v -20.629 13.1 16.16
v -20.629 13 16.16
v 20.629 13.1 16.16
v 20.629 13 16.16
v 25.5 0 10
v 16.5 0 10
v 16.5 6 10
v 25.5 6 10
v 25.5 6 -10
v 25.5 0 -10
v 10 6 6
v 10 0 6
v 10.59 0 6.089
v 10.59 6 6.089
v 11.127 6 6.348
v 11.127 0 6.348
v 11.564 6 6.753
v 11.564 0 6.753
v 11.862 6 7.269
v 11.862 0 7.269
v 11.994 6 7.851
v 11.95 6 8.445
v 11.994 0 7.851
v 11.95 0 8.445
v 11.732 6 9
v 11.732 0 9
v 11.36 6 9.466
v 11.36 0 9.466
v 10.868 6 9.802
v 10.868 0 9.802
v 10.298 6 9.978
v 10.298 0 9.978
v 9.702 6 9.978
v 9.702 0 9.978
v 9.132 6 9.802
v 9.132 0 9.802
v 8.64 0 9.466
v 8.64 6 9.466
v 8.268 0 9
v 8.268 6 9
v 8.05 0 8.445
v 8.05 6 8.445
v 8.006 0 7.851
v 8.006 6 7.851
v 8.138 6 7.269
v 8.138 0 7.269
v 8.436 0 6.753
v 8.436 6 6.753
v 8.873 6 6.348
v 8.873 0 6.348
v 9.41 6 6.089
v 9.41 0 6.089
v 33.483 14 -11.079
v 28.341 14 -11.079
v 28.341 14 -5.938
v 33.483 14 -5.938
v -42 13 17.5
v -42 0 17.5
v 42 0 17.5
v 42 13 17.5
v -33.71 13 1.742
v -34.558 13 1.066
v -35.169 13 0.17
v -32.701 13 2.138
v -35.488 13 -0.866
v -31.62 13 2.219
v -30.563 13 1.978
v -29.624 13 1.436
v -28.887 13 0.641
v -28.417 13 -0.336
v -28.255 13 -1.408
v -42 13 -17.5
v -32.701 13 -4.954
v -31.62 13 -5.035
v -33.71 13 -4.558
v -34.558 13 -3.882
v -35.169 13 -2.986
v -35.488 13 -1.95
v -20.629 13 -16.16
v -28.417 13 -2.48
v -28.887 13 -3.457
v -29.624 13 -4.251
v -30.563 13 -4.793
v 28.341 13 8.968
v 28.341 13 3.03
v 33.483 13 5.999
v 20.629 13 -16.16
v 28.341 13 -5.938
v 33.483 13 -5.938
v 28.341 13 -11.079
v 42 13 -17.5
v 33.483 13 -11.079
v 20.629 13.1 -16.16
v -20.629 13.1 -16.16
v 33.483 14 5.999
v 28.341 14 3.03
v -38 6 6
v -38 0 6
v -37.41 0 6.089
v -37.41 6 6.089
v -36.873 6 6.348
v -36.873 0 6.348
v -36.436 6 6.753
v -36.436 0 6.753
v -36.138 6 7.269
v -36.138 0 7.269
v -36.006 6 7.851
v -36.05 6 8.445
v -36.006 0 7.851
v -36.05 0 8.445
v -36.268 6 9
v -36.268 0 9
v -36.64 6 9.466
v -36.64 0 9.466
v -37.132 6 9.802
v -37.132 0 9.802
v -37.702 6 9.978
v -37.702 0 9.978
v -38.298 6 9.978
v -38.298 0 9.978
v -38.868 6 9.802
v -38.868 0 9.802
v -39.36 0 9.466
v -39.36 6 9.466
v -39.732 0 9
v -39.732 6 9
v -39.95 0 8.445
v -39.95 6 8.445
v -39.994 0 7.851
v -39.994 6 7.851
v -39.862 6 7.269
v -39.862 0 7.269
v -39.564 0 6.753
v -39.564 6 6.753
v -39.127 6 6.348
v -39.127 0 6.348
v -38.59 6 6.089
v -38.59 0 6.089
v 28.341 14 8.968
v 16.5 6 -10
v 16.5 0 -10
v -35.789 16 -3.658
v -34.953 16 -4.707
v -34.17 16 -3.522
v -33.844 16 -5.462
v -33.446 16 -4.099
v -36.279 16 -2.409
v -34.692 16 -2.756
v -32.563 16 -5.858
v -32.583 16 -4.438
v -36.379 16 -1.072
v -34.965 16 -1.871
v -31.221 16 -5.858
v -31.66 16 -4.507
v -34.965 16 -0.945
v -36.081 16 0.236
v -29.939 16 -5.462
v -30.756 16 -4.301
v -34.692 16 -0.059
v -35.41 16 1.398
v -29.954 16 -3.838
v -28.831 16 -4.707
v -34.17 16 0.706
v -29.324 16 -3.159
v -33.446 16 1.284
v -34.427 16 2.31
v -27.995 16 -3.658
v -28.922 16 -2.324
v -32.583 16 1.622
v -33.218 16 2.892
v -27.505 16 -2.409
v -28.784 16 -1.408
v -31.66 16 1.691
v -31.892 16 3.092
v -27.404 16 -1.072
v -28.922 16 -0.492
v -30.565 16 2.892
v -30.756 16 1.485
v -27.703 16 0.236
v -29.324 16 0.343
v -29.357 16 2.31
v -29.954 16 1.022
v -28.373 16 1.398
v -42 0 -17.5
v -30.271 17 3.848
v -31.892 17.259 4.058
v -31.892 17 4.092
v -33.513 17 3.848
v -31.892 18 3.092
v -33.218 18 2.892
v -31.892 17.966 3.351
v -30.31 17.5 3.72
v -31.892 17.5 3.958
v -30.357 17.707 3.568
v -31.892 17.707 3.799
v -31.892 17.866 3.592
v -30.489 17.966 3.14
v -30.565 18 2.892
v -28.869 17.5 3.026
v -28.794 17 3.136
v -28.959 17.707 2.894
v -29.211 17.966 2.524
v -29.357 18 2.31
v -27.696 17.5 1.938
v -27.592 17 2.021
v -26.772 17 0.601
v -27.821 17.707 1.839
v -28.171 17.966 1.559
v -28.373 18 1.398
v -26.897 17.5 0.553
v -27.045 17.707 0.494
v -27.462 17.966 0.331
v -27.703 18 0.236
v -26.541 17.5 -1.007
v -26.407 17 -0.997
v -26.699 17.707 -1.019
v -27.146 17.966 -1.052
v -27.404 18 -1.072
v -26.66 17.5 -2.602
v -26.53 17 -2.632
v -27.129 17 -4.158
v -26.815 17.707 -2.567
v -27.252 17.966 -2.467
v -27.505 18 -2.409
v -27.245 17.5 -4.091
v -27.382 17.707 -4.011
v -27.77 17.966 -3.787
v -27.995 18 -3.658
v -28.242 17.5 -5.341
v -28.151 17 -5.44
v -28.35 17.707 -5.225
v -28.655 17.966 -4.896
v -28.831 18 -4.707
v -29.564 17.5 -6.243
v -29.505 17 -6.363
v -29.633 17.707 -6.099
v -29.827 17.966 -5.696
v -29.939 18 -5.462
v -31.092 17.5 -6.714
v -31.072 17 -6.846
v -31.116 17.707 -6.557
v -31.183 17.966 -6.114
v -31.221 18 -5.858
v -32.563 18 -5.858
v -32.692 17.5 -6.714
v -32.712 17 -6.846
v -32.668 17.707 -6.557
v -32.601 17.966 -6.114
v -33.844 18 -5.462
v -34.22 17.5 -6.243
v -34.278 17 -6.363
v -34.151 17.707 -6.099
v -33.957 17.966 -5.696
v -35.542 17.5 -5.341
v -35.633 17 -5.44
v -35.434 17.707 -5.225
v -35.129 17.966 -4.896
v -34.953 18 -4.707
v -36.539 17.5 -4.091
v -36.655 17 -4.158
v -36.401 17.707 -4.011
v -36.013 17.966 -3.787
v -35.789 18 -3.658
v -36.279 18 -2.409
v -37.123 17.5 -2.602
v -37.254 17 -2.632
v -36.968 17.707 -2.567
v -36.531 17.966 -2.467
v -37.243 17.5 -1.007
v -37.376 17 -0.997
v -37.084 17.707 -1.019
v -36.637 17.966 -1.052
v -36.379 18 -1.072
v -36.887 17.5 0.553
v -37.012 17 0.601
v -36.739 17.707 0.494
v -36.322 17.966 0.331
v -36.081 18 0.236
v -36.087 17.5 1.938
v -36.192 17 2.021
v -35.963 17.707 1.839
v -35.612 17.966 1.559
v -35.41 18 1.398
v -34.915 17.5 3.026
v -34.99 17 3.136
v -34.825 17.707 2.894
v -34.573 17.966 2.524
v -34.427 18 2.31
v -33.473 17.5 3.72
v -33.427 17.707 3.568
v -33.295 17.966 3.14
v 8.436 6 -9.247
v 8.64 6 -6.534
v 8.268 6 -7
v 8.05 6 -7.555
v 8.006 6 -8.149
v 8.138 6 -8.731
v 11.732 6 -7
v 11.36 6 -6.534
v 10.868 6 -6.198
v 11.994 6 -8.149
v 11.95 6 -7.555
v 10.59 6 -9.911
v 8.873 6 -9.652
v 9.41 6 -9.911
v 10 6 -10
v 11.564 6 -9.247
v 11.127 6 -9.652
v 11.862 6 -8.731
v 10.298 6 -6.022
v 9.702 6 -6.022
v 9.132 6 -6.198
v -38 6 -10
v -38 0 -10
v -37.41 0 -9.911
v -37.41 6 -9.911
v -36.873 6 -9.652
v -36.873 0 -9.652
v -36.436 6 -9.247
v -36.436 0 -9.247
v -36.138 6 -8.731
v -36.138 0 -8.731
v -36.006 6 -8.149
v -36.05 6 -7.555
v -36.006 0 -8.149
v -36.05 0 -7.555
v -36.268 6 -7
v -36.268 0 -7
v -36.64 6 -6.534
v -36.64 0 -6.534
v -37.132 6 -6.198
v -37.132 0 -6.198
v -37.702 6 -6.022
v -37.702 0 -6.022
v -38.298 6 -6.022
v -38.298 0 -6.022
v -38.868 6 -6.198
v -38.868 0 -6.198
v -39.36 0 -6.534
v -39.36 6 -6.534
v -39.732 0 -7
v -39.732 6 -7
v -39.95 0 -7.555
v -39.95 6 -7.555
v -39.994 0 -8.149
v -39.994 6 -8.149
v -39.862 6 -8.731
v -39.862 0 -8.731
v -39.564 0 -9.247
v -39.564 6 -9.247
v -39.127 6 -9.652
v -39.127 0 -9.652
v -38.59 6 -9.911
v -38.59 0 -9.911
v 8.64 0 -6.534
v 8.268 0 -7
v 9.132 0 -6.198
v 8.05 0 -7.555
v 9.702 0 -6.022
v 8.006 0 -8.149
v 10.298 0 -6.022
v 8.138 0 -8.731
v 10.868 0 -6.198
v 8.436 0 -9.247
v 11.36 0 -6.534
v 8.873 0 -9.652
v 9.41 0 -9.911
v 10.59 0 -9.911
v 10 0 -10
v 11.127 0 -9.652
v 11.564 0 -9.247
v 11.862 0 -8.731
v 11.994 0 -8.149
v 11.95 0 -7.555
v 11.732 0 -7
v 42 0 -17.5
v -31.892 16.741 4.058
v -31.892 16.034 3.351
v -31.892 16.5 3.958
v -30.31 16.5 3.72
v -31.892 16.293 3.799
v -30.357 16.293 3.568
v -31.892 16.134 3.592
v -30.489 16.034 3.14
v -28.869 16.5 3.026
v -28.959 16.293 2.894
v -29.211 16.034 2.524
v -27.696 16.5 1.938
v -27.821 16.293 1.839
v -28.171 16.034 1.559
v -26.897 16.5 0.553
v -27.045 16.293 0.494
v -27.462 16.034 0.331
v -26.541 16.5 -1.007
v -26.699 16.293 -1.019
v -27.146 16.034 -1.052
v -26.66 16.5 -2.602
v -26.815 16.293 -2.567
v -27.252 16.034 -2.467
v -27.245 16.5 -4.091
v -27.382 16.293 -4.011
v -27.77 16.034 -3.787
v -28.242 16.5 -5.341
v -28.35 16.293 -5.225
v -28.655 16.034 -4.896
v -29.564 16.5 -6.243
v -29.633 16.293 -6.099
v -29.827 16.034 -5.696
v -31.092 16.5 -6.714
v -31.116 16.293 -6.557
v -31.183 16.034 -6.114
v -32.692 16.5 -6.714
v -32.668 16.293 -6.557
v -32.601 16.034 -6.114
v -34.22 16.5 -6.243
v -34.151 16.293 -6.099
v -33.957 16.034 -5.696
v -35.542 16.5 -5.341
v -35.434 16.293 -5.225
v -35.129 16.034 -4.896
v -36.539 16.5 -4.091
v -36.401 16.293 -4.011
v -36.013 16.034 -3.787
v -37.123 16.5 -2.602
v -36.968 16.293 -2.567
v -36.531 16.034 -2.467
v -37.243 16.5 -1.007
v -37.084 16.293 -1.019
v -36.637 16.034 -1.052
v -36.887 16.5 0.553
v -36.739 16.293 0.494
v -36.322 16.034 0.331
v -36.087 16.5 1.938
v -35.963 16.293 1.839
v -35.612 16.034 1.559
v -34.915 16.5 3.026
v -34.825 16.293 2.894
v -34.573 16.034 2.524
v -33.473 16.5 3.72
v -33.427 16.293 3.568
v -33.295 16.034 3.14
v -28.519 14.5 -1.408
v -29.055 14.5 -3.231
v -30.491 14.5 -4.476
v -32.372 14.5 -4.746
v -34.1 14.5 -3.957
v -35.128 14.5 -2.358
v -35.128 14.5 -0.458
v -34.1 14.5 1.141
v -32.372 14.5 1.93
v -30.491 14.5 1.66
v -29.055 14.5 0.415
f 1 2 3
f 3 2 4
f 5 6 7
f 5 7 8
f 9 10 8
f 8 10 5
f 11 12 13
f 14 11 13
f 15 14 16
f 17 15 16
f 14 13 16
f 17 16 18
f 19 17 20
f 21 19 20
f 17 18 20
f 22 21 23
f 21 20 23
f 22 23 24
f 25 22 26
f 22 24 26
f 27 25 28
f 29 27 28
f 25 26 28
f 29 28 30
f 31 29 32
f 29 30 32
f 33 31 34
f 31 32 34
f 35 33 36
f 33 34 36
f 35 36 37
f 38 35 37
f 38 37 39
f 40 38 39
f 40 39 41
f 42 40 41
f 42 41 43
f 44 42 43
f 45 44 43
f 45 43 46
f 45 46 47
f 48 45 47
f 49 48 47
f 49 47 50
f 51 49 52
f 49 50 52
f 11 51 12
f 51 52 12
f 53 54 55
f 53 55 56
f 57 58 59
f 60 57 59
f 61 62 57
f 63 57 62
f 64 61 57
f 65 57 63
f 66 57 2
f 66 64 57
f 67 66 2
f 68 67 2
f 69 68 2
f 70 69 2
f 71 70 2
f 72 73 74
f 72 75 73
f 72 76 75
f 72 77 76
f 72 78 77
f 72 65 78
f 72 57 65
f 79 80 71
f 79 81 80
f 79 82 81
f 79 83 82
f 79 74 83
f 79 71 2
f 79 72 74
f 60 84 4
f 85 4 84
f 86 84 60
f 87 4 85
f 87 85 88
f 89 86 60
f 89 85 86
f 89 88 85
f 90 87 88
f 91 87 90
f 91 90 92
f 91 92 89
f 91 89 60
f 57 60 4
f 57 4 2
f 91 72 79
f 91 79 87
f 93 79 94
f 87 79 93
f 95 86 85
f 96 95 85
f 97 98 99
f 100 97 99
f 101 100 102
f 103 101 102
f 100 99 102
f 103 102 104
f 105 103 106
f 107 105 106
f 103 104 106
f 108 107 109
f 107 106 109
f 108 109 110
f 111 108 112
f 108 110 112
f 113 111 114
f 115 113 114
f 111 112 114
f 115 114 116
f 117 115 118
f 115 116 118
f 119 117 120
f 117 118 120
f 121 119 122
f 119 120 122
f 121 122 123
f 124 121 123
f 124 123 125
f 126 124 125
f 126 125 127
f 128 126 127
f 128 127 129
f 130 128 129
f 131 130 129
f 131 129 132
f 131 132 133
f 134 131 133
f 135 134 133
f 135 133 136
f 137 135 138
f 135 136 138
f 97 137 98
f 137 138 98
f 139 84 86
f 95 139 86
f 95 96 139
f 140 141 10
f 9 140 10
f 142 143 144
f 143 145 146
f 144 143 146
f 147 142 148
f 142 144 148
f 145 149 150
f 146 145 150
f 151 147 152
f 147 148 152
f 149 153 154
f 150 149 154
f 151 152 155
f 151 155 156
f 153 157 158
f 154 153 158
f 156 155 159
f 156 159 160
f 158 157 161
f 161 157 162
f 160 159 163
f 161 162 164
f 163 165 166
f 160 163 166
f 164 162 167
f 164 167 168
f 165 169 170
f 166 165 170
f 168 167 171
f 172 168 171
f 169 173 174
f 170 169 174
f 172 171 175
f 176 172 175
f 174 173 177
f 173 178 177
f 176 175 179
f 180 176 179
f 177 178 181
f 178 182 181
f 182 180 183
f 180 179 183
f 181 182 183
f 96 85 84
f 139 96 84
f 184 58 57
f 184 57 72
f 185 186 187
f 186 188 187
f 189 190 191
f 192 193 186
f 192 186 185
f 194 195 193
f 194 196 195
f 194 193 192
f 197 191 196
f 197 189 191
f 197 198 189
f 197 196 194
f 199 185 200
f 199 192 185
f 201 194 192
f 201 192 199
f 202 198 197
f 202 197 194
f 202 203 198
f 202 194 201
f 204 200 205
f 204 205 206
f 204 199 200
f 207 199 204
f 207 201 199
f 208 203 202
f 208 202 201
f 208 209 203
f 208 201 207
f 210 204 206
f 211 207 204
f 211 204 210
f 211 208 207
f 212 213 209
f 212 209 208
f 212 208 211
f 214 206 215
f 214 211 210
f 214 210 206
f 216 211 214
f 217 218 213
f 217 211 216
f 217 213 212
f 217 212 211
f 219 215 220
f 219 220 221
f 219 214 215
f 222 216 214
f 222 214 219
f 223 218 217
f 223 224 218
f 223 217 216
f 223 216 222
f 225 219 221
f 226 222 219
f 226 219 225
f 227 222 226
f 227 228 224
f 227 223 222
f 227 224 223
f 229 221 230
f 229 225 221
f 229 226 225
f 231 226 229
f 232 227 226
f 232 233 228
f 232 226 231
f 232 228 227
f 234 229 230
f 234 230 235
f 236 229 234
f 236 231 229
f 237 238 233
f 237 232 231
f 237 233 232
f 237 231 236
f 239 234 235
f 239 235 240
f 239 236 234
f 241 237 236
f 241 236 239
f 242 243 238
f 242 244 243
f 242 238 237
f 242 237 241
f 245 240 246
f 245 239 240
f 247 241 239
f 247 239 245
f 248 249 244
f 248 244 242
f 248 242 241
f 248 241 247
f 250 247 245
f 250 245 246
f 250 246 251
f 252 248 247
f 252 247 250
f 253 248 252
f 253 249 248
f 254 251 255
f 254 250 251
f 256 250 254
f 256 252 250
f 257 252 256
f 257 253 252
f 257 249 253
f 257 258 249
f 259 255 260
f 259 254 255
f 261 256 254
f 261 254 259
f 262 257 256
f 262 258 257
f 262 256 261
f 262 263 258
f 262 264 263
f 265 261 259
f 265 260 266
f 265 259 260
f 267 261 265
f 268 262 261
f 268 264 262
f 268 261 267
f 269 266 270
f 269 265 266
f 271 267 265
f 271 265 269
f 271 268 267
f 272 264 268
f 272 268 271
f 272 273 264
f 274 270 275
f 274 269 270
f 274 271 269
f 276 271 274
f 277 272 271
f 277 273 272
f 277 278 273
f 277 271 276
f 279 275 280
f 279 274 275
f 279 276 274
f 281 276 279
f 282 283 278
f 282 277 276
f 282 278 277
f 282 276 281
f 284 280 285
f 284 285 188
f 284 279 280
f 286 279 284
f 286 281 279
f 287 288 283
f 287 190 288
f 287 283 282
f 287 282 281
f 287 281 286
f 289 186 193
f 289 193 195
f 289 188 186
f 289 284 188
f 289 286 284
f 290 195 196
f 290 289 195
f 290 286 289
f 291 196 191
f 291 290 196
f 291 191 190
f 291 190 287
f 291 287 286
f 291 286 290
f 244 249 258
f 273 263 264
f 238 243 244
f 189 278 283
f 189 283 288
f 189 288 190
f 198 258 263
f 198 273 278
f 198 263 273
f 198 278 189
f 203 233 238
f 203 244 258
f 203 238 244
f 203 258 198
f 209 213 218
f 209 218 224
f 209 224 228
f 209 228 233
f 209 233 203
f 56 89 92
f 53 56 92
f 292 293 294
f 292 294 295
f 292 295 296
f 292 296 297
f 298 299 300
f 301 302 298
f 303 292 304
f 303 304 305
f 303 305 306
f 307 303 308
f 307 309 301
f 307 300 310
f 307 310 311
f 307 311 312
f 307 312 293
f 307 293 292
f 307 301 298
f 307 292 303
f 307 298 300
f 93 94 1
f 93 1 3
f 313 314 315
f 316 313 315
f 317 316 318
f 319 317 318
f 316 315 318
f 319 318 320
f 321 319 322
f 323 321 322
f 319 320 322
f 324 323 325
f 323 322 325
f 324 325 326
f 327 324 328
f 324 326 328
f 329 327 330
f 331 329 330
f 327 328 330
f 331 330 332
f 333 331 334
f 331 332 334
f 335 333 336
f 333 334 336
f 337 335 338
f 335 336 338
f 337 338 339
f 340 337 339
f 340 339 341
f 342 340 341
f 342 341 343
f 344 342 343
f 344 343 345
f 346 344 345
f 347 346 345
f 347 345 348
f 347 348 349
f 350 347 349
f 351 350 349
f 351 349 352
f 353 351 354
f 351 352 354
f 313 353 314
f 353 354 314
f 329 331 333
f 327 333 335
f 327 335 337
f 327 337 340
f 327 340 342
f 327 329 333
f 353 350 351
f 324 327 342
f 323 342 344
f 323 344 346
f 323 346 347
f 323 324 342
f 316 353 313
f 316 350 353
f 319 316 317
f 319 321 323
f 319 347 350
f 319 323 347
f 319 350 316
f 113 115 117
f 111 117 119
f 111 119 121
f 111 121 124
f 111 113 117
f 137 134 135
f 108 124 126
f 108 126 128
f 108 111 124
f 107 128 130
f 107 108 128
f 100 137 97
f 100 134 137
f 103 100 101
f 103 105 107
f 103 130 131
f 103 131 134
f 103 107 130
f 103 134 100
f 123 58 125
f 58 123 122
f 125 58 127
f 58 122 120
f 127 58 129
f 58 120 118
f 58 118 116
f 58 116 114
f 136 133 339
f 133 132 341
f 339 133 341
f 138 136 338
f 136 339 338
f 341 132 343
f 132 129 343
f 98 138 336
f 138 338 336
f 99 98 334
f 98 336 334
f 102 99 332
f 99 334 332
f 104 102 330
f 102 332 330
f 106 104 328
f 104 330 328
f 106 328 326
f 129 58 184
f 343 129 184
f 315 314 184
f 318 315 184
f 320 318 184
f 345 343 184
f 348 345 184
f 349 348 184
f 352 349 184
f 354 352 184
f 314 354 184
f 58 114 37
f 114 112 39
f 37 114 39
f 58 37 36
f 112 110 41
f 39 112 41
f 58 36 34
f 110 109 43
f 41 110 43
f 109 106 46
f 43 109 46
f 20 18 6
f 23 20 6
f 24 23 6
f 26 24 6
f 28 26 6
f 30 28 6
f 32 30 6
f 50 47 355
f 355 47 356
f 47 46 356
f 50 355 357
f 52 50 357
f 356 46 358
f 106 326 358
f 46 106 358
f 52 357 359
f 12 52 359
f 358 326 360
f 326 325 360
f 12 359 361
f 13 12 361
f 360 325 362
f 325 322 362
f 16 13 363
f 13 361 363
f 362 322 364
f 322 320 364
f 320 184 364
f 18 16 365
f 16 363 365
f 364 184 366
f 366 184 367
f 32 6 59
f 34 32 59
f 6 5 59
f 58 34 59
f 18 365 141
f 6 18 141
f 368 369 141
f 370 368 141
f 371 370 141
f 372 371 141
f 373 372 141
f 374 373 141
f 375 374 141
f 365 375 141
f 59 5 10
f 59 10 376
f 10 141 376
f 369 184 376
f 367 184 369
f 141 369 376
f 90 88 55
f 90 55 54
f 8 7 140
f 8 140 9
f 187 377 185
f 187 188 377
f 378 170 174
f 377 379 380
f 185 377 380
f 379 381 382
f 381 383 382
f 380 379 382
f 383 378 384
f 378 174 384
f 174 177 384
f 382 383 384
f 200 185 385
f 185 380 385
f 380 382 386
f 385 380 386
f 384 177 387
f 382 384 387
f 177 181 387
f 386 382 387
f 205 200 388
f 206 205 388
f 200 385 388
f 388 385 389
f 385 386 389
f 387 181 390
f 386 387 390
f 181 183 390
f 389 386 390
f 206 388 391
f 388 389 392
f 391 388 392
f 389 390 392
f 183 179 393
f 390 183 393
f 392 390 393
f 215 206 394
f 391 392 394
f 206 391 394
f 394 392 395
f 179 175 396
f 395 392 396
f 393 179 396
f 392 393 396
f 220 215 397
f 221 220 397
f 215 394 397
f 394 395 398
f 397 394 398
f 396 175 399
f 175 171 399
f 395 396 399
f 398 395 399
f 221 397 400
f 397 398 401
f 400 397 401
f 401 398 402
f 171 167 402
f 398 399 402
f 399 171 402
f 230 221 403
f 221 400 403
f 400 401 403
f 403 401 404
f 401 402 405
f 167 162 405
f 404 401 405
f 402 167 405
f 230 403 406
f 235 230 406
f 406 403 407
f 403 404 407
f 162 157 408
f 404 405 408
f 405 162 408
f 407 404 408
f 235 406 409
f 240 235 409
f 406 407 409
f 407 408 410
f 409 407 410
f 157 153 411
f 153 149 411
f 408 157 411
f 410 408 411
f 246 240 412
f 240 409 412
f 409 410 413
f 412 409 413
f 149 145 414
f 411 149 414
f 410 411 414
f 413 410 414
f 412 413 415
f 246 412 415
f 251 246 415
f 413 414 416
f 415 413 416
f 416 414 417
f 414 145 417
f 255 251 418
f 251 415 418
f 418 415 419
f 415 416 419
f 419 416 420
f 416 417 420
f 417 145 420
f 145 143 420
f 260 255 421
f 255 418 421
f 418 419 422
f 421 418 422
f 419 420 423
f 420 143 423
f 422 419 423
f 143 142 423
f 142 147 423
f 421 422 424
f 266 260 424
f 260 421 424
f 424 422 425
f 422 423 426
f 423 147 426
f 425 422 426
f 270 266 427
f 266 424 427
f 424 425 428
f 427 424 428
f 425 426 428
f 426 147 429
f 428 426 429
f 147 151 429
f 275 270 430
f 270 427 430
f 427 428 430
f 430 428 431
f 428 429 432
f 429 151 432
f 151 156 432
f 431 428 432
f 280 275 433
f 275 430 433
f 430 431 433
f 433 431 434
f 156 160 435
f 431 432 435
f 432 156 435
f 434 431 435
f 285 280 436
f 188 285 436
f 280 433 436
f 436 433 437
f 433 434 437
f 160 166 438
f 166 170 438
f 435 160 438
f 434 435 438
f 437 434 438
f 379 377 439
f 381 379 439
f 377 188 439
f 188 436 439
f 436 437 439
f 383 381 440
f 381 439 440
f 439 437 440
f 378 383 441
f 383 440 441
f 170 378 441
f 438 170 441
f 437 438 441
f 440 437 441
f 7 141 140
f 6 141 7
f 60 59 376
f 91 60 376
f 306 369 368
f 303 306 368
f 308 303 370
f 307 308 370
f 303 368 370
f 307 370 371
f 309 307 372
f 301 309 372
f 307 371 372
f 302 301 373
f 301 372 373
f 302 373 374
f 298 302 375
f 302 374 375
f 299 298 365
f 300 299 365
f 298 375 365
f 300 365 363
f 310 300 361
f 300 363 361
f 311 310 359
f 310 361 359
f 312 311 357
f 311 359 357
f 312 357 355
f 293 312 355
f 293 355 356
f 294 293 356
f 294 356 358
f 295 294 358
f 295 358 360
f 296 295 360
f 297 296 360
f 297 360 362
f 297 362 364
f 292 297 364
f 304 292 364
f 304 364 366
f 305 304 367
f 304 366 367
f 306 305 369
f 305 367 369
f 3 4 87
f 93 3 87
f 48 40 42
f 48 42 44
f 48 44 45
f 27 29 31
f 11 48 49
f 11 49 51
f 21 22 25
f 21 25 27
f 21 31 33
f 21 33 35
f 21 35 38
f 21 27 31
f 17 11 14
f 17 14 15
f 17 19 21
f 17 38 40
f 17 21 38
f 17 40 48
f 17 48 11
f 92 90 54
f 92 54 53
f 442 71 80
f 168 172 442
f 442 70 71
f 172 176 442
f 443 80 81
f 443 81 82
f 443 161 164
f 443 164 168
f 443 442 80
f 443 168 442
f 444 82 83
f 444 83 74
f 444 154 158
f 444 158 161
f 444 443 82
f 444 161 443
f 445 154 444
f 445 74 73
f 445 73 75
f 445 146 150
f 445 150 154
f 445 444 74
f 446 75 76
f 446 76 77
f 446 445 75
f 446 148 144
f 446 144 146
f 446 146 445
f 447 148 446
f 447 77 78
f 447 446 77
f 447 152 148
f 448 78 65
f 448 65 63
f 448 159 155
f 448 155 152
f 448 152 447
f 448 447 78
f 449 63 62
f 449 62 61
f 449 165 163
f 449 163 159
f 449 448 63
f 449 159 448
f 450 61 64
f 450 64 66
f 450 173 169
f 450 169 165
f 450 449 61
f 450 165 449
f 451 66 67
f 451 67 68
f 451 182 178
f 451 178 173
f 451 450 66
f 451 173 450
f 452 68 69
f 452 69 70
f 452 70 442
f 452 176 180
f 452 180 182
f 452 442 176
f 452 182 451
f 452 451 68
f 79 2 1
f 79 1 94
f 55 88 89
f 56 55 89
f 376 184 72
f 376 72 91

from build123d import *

# Parameters (mm, degrees)
SKETCH_1_W          = 84
SKETCH_1_H          = 35
EXTRUDE_1_DEPTH     = 13
SKETCH_2_R          = 3.636879205
EXTRUDE_2_DEPTH     = 3
EXTRUDE_2_TAPER     = 10
SKETCH_2_3_W        = 5.141866658
SKETCH_2_3_H        = 5.141866659
EXTRUDE_3_DEPTH     = 1
SKETCH_2_4_W        = 41.257358664
SKETCH_2_4_H        = 32.32030471
EXTRUDE_4_DEPTH     = 0.1
SKETCH_4_R          = 5.5
EXTRUDE_5_DEPTH     = 2
FILLET_1_R          = 1
SKETCH_5_R          = 2
SKETCH_5_W          = 9
SKETCH_5_H          = 20
CUT_EXTRUDE_1_DEPTH = 6


with BuildPart() as part:
    # 草图1 → 凸台-拉伸1 (new body)
    with BuildSketch(Plane(origin=(0, 0, 0), x_dir=(1, 0, 0), z_dir=(0, 1, 0))):
        Rectangle(SKETCH_1_W, SKETCH_1_H)
    extrude(amount=EXTRUDE_1_DEPTH)

    # 草图2 → 凸台-拉伸2 (add)
    with BuildSketch(Plane(origin=(0, 13, 0), x_dir=(1, 0, 0), z_dir=(0, 1, 0))):
        with Locations((-31.891815821, 1.407892061)):
            Circle(SKETCH_2_R)
    extrude(amount=EXTRUDE_2_DEPTH, taper=EXTRUDE_2_TAPER)

    # 草图2<3> → 凸台-拉伸3 (add)
    with BuildSketch(Plane(origin=(0, 13, 0), x_dir=(1, 0, 0), z_dir=(0, 1, 0))):
        with Locations((30.912412648, 8.508565066)):
            Rectangle(SKETCH_2_3_W, SKETCH_2_3_H)
        Polygon((28.341479319, -3.030186335), (28.341479319, -8.967502534), (33.483345977, -5.998844435), align=None)
    extrude(amount=EXTRUDE_3_DEPTH)

    # 草图2<4> → 凸台-拉伸4 (add)
    with BuildSketch(Plane(origin=(0, 13, 0), x_dir=(1, 0, 0), z_dir=(0, 1, 0))):
        Rectangle(SKETCH_2_4_W, SKETCH_2_4_H)
    extrude(amount=EXTRUDE_4_DEPTH)

    # 草图4 → 凸台-拉伸5 (add)
    with BuildSketch(Plane(origin=(0, 16, 0), x_dir=(1, 0, 0), z_dir=(0, 1, 0))):
        with Locations(Location((-31.891815821, 1.407892061, 0), (0, 0, 270))):
            Circle(SKETCH_4_R)
    extrude(amount=EXTRUDE_5_DEPTH)

    # 圆角1
    fillet_1_edges = [part.edges().sort_by_distance(p)[0] for p in [
        (-31.891815821, 16, -6.907892061),
        (-31.891815821, 18, -6.907892061),
    ]]
    fillet(fillet_1_edges, radius=FILLET_1_R - 0.0001)  # a hair under: the kernel refuses the full size

    # 草图5 → 切除-拉伸1 (cut)
    with BuildSketch(Plane.XZ):
        with Locations(Location((-38, 8, 0), (0, 0, 270))):
            Circle(SKETCH_5_R)
        with Locations(Location((-38, -8, 0), (0, 0, 270))):
            Circle(SKETCH_5_R)
        with Locations(Location((10, 8, 0), (0, 0, 270))):
            Circle(SKETCH_5_R)
        with Locations(Location((10, -8, 0), (0, 0, 270))):
            Circle(SKETCH_5_R)
        with Locations((21, 0)):
            Rectangle(SKETCH_5_W, SKETCH_5_H)
    extrude(amount=-CUT_EXTRUDE_1_DEPTH, mode=Mode.SUBTRACT)


solid = part.part
